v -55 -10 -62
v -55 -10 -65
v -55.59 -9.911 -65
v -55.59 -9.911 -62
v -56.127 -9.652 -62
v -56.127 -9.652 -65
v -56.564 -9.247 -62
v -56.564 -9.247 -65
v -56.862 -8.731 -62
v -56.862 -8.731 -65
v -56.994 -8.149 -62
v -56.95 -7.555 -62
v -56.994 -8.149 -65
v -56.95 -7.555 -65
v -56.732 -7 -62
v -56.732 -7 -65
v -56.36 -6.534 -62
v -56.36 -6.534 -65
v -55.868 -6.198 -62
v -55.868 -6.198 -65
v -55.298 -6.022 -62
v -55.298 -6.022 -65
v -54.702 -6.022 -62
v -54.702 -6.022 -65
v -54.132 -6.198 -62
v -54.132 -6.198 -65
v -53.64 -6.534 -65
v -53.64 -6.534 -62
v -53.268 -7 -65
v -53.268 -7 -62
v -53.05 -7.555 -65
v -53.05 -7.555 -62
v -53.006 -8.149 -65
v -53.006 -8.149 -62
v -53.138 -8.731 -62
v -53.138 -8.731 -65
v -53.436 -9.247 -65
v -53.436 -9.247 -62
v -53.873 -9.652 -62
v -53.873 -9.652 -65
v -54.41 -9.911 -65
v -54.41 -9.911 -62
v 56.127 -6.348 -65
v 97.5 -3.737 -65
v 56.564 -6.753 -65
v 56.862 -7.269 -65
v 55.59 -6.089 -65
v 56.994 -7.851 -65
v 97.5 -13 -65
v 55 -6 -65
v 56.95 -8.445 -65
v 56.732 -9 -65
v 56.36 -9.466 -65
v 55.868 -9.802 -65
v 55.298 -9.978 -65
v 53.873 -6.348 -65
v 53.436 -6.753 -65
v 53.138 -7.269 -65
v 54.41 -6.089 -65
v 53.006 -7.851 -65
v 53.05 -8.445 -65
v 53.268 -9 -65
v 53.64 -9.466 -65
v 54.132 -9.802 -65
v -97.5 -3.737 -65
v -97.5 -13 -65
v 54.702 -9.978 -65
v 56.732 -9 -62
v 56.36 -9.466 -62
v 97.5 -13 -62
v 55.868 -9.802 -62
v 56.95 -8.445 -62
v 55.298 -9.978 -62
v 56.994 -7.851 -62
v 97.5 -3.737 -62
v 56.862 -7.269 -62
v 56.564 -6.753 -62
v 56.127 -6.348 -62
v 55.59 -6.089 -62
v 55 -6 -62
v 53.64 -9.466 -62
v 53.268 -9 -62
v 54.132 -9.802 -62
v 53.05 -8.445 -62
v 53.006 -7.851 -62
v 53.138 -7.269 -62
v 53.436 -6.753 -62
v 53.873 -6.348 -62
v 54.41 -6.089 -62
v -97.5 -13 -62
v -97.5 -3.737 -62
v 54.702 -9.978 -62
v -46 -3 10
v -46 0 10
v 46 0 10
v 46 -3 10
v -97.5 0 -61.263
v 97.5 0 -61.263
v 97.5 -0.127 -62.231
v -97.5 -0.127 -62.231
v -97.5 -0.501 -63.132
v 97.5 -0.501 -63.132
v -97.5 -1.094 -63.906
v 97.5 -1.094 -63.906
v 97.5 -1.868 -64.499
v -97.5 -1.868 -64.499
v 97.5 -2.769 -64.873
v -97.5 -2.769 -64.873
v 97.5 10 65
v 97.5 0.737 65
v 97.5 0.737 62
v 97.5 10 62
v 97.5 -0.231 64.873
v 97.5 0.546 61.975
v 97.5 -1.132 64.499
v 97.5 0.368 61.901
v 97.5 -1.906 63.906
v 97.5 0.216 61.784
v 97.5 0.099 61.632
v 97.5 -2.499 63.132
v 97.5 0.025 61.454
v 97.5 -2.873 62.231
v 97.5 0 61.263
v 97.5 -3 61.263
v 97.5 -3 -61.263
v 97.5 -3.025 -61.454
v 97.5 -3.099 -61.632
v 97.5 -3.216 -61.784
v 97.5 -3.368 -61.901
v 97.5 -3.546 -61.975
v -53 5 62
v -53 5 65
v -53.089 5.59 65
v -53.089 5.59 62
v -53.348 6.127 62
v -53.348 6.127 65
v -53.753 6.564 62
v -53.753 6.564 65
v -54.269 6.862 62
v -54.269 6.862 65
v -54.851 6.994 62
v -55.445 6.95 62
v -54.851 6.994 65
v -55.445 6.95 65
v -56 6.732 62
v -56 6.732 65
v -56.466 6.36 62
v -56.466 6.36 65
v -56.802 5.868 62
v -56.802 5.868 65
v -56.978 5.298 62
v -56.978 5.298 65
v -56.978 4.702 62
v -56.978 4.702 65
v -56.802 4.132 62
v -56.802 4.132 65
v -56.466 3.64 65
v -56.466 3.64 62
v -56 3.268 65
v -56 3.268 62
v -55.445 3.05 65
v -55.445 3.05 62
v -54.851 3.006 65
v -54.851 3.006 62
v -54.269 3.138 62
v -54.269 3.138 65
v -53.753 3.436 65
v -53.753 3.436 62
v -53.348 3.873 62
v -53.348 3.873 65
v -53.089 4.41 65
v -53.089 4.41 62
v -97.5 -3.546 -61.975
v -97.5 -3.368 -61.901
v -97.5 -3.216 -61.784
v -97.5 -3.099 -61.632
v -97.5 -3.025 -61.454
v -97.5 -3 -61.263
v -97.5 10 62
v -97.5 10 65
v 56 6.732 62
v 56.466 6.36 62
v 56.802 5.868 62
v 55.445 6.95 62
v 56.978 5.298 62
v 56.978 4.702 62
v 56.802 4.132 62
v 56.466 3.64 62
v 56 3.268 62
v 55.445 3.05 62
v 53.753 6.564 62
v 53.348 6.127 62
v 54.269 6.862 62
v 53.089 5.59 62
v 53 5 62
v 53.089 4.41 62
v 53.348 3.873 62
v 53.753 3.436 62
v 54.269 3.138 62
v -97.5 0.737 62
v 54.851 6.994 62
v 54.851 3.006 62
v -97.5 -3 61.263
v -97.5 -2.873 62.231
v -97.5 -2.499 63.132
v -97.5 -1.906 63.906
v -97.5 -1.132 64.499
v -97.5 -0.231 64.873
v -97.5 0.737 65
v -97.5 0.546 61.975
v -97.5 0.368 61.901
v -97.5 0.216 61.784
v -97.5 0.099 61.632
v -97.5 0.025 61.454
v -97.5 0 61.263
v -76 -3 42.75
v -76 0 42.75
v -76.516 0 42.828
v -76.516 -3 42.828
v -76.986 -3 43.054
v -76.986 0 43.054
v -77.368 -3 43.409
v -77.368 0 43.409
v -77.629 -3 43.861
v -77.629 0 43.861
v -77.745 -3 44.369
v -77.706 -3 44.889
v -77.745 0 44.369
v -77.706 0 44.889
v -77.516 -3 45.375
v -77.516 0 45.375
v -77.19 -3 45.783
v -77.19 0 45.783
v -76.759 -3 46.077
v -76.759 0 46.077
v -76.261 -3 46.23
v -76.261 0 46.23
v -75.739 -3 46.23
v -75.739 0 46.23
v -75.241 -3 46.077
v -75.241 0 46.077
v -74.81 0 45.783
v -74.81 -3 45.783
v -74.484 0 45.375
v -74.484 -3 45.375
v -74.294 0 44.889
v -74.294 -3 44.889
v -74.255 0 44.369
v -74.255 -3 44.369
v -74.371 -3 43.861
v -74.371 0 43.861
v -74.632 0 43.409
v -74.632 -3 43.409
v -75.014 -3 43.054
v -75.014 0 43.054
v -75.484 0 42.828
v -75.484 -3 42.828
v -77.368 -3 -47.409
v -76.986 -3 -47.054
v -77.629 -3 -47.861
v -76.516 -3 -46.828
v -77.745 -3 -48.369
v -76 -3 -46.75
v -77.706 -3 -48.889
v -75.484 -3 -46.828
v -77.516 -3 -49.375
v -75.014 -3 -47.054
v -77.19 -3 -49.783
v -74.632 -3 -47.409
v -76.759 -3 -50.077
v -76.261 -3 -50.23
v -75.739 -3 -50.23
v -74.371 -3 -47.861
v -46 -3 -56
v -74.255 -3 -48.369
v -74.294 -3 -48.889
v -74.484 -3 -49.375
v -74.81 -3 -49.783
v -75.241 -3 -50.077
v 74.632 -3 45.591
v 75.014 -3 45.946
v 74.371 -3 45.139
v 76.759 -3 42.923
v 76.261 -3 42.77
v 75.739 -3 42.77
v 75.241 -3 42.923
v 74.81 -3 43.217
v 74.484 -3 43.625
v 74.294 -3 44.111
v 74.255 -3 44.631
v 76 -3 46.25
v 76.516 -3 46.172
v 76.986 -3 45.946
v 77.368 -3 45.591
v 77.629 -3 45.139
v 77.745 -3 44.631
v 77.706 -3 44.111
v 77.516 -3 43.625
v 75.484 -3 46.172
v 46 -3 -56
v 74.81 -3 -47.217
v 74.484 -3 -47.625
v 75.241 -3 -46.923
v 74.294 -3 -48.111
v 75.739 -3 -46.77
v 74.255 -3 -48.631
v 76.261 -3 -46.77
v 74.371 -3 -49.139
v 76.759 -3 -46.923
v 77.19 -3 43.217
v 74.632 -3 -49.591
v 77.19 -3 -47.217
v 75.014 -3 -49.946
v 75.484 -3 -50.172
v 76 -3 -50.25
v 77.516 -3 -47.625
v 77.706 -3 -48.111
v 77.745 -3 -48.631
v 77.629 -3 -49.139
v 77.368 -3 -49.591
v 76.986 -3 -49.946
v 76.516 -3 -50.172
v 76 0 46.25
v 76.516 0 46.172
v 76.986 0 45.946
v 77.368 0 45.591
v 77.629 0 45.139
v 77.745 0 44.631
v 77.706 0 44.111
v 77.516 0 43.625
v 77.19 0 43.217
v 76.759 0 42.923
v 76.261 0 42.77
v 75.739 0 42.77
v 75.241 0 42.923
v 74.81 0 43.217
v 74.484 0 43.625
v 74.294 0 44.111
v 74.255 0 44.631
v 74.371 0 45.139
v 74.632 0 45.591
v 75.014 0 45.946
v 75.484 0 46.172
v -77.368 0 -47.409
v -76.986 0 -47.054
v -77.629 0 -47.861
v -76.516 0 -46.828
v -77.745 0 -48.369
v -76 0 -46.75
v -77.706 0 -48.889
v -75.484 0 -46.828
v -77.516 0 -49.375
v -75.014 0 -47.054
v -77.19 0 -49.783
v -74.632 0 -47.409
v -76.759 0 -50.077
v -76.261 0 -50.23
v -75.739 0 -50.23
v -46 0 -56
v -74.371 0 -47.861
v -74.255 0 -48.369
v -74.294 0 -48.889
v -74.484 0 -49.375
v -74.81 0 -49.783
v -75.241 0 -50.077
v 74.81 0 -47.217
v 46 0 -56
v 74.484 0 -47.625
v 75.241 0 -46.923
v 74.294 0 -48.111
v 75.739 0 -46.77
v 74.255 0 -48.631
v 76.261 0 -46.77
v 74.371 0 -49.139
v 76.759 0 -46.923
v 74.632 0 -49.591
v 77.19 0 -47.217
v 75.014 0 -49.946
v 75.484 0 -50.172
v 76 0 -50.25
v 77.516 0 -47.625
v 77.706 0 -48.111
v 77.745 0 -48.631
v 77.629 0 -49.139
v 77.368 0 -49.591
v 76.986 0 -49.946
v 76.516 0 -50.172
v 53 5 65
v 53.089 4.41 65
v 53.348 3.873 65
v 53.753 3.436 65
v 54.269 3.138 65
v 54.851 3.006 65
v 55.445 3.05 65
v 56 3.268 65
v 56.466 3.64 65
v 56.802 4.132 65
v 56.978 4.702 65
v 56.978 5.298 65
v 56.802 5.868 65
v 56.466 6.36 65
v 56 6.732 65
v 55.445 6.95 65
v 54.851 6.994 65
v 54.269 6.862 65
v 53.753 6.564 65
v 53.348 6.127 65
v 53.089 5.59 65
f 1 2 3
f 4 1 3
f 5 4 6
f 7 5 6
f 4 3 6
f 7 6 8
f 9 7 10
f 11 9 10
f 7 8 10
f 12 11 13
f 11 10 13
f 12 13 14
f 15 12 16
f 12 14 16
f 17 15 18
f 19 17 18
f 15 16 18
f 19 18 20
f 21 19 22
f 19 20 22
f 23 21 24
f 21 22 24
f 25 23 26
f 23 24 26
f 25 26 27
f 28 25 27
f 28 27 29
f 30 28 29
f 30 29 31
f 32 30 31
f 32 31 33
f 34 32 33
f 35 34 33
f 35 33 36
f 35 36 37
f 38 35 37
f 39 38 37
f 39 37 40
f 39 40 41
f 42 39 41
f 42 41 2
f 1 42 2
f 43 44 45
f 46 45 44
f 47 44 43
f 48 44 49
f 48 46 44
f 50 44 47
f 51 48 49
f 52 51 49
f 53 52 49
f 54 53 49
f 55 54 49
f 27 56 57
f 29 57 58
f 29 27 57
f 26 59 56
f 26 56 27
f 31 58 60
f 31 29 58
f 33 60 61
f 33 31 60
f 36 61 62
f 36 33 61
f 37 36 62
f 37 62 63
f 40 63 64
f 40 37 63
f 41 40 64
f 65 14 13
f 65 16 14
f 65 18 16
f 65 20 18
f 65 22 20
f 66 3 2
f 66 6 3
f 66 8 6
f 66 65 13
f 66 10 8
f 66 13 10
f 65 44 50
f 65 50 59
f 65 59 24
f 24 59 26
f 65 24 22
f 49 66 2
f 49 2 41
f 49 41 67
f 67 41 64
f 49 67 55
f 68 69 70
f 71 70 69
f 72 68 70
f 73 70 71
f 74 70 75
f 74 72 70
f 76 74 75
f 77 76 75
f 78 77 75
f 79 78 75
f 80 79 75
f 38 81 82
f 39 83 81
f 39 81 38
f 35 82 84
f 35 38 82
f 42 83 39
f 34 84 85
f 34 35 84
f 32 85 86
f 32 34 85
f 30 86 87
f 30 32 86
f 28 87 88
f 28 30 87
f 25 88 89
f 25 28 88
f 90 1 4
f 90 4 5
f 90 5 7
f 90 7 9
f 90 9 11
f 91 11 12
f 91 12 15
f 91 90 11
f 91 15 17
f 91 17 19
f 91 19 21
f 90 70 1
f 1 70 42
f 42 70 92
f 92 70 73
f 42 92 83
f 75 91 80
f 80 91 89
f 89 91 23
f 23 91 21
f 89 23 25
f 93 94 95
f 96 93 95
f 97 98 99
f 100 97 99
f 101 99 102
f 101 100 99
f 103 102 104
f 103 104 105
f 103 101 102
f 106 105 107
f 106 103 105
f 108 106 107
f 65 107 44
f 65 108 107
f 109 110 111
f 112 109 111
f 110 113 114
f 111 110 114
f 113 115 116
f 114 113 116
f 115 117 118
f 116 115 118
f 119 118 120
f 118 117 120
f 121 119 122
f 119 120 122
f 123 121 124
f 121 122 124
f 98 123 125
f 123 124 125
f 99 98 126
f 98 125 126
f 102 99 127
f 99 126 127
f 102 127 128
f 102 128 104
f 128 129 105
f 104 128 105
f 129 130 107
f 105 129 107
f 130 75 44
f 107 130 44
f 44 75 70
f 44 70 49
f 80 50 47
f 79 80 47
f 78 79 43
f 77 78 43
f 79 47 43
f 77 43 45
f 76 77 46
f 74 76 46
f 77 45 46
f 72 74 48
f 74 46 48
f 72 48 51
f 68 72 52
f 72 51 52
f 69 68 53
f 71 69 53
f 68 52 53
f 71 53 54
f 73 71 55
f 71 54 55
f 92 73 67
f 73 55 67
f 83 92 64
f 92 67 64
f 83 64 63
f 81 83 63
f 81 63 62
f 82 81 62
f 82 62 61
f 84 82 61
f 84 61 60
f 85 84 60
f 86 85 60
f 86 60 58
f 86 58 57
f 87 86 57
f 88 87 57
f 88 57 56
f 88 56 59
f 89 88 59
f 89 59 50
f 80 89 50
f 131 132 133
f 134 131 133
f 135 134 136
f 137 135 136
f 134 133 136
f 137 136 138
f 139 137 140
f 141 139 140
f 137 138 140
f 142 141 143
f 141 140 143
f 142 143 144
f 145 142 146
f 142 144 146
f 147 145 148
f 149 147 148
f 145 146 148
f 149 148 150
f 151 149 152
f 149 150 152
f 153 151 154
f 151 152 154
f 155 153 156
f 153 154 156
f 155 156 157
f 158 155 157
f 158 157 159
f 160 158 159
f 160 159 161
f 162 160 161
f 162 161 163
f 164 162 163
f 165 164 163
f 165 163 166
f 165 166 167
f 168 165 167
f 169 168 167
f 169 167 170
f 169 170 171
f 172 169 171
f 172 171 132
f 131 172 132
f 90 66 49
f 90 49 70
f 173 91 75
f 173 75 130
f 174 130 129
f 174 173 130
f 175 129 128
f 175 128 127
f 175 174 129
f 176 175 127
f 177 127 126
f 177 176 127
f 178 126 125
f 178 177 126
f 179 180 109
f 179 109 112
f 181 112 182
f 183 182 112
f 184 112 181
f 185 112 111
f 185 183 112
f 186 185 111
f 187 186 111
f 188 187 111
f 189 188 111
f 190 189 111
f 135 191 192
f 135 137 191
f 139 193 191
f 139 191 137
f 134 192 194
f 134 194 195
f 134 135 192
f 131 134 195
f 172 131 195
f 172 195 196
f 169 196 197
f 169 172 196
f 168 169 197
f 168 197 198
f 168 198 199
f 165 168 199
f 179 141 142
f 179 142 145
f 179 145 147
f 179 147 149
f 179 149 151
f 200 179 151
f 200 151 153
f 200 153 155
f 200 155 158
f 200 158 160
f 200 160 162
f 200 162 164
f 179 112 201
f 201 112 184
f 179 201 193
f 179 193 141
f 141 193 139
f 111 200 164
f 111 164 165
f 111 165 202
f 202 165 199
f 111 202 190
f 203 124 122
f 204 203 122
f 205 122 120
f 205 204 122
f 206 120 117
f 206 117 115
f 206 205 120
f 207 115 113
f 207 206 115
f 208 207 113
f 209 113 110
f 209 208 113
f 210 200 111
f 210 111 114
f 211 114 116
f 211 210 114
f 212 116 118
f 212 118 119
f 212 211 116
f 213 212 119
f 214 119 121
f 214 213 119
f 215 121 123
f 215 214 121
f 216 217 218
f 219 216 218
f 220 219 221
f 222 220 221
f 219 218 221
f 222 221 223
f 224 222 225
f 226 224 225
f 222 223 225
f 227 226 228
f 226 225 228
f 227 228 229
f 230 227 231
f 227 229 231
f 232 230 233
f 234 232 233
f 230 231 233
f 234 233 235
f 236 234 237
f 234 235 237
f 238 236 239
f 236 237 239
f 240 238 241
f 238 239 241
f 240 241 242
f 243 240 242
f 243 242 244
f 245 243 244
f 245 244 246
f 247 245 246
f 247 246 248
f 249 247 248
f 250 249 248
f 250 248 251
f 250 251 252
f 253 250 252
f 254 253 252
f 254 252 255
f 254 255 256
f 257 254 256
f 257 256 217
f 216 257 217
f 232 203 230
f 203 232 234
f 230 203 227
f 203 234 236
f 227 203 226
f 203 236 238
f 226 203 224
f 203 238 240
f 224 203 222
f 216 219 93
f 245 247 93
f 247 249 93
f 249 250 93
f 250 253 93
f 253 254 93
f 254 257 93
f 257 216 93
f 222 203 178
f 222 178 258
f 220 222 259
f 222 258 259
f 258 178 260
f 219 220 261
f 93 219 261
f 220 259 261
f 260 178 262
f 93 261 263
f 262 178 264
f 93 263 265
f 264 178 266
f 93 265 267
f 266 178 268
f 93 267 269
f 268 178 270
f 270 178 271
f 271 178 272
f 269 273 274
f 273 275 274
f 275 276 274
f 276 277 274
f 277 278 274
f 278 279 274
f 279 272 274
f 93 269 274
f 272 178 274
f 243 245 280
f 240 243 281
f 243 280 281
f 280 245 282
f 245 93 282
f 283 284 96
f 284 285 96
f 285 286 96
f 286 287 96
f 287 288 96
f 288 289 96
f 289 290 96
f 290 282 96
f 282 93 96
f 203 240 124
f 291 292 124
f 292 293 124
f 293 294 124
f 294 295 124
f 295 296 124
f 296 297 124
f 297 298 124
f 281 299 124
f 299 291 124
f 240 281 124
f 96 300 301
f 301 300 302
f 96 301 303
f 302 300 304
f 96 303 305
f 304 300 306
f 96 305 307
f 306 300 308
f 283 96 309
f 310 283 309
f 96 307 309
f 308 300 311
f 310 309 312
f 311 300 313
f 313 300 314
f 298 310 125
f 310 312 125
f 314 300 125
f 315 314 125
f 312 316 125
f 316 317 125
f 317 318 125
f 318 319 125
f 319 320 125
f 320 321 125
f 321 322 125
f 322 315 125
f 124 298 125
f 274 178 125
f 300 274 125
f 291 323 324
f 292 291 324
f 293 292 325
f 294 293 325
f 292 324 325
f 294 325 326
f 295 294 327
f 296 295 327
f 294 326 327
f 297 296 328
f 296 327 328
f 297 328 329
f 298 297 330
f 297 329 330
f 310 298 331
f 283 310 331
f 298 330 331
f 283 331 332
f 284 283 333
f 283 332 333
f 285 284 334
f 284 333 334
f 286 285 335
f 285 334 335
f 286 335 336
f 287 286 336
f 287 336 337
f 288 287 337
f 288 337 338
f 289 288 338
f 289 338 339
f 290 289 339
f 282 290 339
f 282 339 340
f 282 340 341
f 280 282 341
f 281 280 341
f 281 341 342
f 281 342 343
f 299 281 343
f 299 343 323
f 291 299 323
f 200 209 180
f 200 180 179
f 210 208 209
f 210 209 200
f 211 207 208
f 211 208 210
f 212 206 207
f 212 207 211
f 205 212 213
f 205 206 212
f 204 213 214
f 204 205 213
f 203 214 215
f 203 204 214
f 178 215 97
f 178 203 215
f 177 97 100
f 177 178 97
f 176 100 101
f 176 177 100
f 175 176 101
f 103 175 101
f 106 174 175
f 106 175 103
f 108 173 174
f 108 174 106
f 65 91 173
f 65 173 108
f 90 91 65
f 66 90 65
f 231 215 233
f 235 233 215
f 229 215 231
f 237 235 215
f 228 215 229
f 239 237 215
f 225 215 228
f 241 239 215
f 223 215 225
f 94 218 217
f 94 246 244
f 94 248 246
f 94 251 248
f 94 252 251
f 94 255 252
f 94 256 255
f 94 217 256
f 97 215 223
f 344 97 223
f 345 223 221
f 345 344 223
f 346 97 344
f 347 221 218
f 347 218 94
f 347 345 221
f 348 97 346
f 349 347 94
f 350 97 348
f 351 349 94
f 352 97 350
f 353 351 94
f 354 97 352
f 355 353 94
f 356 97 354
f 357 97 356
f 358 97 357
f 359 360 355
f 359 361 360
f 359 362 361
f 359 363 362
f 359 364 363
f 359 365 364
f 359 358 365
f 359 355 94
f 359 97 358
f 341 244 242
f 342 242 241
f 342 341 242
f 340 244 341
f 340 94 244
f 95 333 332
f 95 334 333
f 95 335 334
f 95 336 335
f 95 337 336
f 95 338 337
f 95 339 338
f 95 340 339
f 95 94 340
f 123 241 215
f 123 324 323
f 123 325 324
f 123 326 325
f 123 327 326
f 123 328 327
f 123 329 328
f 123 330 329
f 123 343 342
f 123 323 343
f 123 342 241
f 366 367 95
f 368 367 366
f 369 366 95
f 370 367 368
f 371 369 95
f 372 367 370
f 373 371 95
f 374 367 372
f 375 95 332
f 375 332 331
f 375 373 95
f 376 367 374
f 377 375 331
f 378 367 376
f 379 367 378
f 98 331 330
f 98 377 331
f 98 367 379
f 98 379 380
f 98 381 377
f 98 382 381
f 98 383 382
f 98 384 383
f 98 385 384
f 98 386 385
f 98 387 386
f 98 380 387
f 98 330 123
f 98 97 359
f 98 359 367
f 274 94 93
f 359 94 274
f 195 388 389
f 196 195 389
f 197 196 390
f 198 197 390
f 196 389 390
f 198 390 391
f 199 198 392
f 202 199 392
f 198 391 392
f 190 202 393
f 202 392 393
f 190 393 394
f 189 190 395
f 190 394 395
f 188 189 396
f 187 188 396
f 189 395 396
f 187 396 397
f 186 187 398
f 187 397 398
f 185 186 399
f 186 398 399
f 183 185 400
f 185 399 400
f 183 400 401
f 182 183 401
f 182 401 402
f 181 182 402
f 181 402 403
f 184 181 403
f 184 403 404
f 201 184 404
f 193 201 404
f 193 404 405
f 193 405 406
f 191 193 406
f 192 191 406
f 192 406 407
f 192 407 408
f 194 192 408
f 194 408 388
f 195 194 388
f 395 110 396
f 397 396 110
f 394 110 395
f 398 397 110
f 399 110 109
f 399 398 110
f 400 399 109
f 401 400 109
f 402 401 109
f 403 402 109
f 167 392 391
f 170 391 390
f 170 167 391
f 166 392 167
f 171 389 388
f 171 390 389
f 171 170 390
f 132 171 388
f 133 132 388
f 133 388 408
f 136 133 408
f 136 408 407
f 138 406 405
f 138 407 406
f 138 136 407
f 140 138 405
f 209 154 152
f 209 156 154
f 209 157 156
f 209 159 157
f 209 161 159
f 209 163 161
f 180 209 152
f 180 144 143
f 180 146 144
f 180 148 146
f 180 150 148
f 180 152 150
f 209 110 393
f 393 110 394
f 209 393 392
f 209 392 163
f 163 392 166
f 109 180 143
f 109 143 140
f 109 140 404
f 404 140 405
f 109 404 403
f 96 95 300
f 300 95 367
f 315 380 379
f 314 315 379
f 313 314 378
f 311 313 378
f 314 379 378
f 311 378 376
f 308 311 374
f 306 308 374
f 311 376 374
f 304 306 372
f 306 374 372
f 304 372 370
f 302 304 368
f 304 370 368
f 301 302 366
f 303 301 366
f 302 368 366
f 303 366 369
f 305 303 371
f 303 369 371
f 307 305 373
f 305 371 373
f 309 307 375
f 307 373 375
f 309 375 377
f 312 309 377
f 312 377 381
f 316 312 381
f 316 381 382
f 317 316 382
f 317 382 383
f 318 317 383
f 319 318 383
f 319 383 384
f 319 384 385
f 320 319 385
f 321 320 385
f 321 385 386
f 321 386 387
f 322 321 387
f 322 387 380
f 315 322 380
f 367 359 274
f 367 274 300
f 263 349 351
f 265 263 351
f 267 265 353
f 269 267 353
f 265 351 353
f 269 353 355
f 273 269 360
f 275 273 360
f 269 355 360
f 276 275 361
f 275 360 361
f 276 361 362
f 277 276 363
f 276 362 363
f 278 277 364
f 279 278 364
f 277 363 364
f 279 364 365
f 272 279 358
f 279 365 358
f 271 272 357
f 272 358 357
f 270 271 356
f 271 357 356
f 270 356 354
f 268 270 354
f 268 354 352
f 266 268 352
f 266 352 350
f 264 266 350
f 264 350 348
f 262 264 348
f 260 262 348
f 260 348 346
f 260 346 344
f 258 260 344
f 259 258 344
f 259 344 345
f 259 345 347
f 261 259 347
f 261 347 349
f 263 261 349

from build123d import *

# Parameters (mm, degrees)
SKETCH_1_W                       = 195
SKETCH_1_H                       = 130
SM_BASE_FLANGE_1_DEPTH           = 3
SM_EDGE_FLANGE_1_STRIP_W         = 13.4732
SM_EDGE_FLANGE_1_STRIP_H         = 3
SM_EDGE_FLANGE_1_STRIP_CUT_DEPTH = 195
SM_EDGE_FLANGE_1_DEPTH           = 195
SM_EDGE_FLANGE_2_STRIP_W         = 13.4732
SM_EDGE_FLANGE_2_STRIP_H         = 3
SM_EDGE_FLANGE_2_STRIP_CUT_DEPTH = 195
SM_EDGE_FLANGE_2_DEPTH           = 195
SKETCH_12_R                      = 2
CUT_EXTRUDE_1_DEPTH              = 10
SKETCH_13_R                      = 2
CUT_EXTRUDE_2_DEPTH              = 10
CUT_EXTRUDE_3_REACH              = 119.899
SKETCH_14_R                      = 1.75
SKETCH_14_W                      = 92
SKETCH_14_H                      = 66


# Sheet-metal steps are written as plain solids
with BuildPart() as part:
    # Sketch 1 → 基体-法兰1 (new body)
    with BuildSketch(Plane(origin=(0, 0, 0), x_dir=(1, 0, 0), z_dir=(0, 1, 0))):
        Rectangle(SKETCH_1_W, SKETCH_1_H)
    extrude(amount=-SM_BASE_FLANGE_1_DEPTH)

    # 边线-法兰1 strip (across the edge) → 边线-法兰1 strip cut (cut)
    with BuildSketch(Plane(origin=(-97.5, 0, 65), x_dir=(0, 0, -1), z_dir=(1, 0, 0))):
        with Locations((-3, -1.5)):
            Rectangle(SM_EDGE_FLANGE_1_STRIP_W, SM_EDGE_FLANGE_1_STRIP_H)
    extrude(amount=SM_EDGE_FLANGE_1_STRIP_CUT_DEPTH, mode=Mode.SUBTRACT)

    # 边线-法兰1 section (across the edge) → 边线-法兰1 (add)
    with BuildSketch(Plane(origin=(-97.5, 0, 65), x_dir=(0, 0, -1), z_dir=(1, 0, 0))):
        with BuildLine():
            Line((0, 0.7366), (0, 10))
            Line((0, 10), (3, 10))
            Line((3, 10), (3, 0.7366))
            ThreePointArc((3, 0.7366), (3.215745145, 0.215745145), (3.7366, 0))
            Line((3.7366, 0), (3.7366, -3))
            ThreePointArc((3.7366, -3), (1.094424801, -1.905575199), (0, 0.7366))
        make_face()
    extrude(amount=SM_EDGE_FLANGE_1_DEPTH)

    # 边线-法兰2 strip (across the edge) → 边线-法兰2 strip cut (cut)
    with BuildSketch(Plane(origin=(-97.5, -3, -65), x_dir=(0, 0, 1), z_dir=(1, 0, 0))):
        with Locations((-3, -1.5)):
            Rectangle(SM_EDGE_FLANGE_2_STRIP_W, SM_EDGE_FLANGE_2_STRIP_H)
    extrude(amount=SM_EDGE_FLANGE_2_STRIP_CUT_DEPTH, mode=Mode.SUBTRACT)

    # 边线-法兰2 section (across the edge) → 边线-法兰2 (add)
    with BuildSketch(Plane(origin=(-97.5, -3, -65), x_dir=(0, 0, 1), z_dir=(1, 0, 0))):
        with BuildLine():
            Line((0, 0.7366), (0, 10))
            Line((0, 10), (3, 10))
            Line((3, 10), (3, 0.7366))
            ThreePointArc((3, 0.7366), (3.215745145, 0.215745145), (3.7366, 0))
            Line((3.7366, 0), (3.7366, -3))
            ThreePointArc((3.7366, -3), (1.094424801, -1.905575199), (0, 0.7366))
        make_face()
    extrude(amount=SM_EDGE_FLANGE_2_DEPTH)

    # 草图12 → 切除-拉伸1 (cut)
    with BuildSketch(Plane.XY.offset(65)):
        with Locations((-55, 5)):
            Circle(SKETCH_12_R)
        with Locations(Location((55, 5, 0), (0, 0, 180))):
            Circle(SKETCH_12_R)
    extrude(amount=-CUT_EXTRUDE_1_DEPTH, mode=Mode.SUBTRACT)

    # 草图13 → 切除-拉伸2 (cut)
    with BuildSketch(Plane(origin=(0, 0, -65), x_dir=(-1, 0, 0), z_dir=(0, 0, -1))):
        with Locations(Location((-55, -8, 0), (0, 0, 90))):
            Circle(SKETCH_13_R)
        with Locations(Location((55, -8, 0), (0, 0, 270))):
            Circle(SKETCH_13_R)
    extrude(amount=-CUT_EXTRUDE_2_DEPTH, mode=Mode.SUBTRACT)

    # 草图14 → 切除-拉伸3 (cut, up to next)
    with BuildSketch(Plane(origin=(0, 0, 0), x_dir=(1, 0, 0), z_dir=(0, 1, 0)), mode=Mode.PRIVATE) as cut_extrude_3_sk1:
        with Locations(Location((-76, 48.5, 0), (0, 0, 270))):
            Circle(SKETCH_14_R)
    cut_extrude_3_tool1 = extrude(cut_extrude_3_sk1.sketch, amount=-CUT_EXTRUDE_3_REACH, mode=Mode.PRIVATE) & part.part
    # 草图14 → 切除-拉伸3 (cut, up to next)
    with BuildSketch(Plane(origin=(0, 0, 0), x_dir=(1, 0, 0), z_dir=(0, 1, 0)), mode=Mode.PRIVATE) as cut_extrude_3_sk2:
        with Locations(Location((76, 48.5, 0), (0, 0, 90))):
            Circle(SKETCH_14_R)
    cut_extrude_3_tool2 = extrude(cut_extrude_3_sk2.sketch, amount=-CUT_EXTRUDE_3_REACH, mode=Mode.PRIVATE) & part.part
    # 草图14 → 切除-拉伸3 (cut, up to next)
    with BuildSketch(Plane(origin=(0, 0, 0), x_dir=(1, 0, 0), z_dir=(0, 1, 0)), mode=Mode.PRIVATE) as cut_extrude_3_sk3:
        with Locations(Location((76, -44.5, 0), (0, 0, 270))):
            Circle(SKETCH_14_R)
    cut_extrude_3_tool3 = extrude(cut_extrude_3_sk3.sketch, amount=-CUT_EXTRUDE_3_REACH, mode=Mode.PRIVATE) & part.part
    # 草图14 → 切除-拉伸3 (cut, up to next)
    with BuildSketch(Plane(origin=(0, 0, 0), x_dir=(1, 0, 0), z_dir=(0, 1, 0)), mode=Mode.PRIVATE) as cut_extrude_3_sk4:
        with Locations(Location((-76, -44.5, 0), (0, 0, 90))):
            Circle(SKETCH_14_R)
    cut_extrude_3_tool4 = extrude(cut_extrude_3_sk4.sketch, amount=-CUT_EXTRUDE_3_REACH, mode=Mode.PRIVATE) & part.part
    # 草图14 → 切除-拉伸3 (cut, up to next)
    with BuildSketch(Plane(origin=(0, 0, 0), x_dir=(1, 0, 0), z_dir=(0, 1, 0)), mode=Mode.PRIVATE) as cut_extrude_3_sk5:
        with Locations((0, 23)):
            Rectangle(SKETCH_14_W, SKETCH_14_H)
    cut_extrude_3_tool5 = extrude(cut_extrude_3_sk5.sketch, amount=-CUT_EXTRUDE_3_REACH, mode=Mode.PRIVATE) & part.part
    add(cut_extrude_3_tool1.solids().sort_by_distance((-76, 0, -48.5))[0], mode=Mode.SUBTRACT)
    add(cut_extrude_3_tool2.solids().sort_by_distance((76, 0, -48.5))[0], mode=Mode.SUBTRACT)
    add(cut_extrude_3_tool3.solids().sort_by_distance((76, 0, 44.5))[0], mode=Mode.SUBTRACT)
    add(cut_extrude_3_tool4.solids().sort_by_distance((-76, 0, 44.5))[0], mode=Mode.SUBTRACT)
    add(cut_extrude_3_tool5.solids().sort_by_distance((0, 0, -23))[0], mode=Mode.SUBTRACT)


solid = part.part
